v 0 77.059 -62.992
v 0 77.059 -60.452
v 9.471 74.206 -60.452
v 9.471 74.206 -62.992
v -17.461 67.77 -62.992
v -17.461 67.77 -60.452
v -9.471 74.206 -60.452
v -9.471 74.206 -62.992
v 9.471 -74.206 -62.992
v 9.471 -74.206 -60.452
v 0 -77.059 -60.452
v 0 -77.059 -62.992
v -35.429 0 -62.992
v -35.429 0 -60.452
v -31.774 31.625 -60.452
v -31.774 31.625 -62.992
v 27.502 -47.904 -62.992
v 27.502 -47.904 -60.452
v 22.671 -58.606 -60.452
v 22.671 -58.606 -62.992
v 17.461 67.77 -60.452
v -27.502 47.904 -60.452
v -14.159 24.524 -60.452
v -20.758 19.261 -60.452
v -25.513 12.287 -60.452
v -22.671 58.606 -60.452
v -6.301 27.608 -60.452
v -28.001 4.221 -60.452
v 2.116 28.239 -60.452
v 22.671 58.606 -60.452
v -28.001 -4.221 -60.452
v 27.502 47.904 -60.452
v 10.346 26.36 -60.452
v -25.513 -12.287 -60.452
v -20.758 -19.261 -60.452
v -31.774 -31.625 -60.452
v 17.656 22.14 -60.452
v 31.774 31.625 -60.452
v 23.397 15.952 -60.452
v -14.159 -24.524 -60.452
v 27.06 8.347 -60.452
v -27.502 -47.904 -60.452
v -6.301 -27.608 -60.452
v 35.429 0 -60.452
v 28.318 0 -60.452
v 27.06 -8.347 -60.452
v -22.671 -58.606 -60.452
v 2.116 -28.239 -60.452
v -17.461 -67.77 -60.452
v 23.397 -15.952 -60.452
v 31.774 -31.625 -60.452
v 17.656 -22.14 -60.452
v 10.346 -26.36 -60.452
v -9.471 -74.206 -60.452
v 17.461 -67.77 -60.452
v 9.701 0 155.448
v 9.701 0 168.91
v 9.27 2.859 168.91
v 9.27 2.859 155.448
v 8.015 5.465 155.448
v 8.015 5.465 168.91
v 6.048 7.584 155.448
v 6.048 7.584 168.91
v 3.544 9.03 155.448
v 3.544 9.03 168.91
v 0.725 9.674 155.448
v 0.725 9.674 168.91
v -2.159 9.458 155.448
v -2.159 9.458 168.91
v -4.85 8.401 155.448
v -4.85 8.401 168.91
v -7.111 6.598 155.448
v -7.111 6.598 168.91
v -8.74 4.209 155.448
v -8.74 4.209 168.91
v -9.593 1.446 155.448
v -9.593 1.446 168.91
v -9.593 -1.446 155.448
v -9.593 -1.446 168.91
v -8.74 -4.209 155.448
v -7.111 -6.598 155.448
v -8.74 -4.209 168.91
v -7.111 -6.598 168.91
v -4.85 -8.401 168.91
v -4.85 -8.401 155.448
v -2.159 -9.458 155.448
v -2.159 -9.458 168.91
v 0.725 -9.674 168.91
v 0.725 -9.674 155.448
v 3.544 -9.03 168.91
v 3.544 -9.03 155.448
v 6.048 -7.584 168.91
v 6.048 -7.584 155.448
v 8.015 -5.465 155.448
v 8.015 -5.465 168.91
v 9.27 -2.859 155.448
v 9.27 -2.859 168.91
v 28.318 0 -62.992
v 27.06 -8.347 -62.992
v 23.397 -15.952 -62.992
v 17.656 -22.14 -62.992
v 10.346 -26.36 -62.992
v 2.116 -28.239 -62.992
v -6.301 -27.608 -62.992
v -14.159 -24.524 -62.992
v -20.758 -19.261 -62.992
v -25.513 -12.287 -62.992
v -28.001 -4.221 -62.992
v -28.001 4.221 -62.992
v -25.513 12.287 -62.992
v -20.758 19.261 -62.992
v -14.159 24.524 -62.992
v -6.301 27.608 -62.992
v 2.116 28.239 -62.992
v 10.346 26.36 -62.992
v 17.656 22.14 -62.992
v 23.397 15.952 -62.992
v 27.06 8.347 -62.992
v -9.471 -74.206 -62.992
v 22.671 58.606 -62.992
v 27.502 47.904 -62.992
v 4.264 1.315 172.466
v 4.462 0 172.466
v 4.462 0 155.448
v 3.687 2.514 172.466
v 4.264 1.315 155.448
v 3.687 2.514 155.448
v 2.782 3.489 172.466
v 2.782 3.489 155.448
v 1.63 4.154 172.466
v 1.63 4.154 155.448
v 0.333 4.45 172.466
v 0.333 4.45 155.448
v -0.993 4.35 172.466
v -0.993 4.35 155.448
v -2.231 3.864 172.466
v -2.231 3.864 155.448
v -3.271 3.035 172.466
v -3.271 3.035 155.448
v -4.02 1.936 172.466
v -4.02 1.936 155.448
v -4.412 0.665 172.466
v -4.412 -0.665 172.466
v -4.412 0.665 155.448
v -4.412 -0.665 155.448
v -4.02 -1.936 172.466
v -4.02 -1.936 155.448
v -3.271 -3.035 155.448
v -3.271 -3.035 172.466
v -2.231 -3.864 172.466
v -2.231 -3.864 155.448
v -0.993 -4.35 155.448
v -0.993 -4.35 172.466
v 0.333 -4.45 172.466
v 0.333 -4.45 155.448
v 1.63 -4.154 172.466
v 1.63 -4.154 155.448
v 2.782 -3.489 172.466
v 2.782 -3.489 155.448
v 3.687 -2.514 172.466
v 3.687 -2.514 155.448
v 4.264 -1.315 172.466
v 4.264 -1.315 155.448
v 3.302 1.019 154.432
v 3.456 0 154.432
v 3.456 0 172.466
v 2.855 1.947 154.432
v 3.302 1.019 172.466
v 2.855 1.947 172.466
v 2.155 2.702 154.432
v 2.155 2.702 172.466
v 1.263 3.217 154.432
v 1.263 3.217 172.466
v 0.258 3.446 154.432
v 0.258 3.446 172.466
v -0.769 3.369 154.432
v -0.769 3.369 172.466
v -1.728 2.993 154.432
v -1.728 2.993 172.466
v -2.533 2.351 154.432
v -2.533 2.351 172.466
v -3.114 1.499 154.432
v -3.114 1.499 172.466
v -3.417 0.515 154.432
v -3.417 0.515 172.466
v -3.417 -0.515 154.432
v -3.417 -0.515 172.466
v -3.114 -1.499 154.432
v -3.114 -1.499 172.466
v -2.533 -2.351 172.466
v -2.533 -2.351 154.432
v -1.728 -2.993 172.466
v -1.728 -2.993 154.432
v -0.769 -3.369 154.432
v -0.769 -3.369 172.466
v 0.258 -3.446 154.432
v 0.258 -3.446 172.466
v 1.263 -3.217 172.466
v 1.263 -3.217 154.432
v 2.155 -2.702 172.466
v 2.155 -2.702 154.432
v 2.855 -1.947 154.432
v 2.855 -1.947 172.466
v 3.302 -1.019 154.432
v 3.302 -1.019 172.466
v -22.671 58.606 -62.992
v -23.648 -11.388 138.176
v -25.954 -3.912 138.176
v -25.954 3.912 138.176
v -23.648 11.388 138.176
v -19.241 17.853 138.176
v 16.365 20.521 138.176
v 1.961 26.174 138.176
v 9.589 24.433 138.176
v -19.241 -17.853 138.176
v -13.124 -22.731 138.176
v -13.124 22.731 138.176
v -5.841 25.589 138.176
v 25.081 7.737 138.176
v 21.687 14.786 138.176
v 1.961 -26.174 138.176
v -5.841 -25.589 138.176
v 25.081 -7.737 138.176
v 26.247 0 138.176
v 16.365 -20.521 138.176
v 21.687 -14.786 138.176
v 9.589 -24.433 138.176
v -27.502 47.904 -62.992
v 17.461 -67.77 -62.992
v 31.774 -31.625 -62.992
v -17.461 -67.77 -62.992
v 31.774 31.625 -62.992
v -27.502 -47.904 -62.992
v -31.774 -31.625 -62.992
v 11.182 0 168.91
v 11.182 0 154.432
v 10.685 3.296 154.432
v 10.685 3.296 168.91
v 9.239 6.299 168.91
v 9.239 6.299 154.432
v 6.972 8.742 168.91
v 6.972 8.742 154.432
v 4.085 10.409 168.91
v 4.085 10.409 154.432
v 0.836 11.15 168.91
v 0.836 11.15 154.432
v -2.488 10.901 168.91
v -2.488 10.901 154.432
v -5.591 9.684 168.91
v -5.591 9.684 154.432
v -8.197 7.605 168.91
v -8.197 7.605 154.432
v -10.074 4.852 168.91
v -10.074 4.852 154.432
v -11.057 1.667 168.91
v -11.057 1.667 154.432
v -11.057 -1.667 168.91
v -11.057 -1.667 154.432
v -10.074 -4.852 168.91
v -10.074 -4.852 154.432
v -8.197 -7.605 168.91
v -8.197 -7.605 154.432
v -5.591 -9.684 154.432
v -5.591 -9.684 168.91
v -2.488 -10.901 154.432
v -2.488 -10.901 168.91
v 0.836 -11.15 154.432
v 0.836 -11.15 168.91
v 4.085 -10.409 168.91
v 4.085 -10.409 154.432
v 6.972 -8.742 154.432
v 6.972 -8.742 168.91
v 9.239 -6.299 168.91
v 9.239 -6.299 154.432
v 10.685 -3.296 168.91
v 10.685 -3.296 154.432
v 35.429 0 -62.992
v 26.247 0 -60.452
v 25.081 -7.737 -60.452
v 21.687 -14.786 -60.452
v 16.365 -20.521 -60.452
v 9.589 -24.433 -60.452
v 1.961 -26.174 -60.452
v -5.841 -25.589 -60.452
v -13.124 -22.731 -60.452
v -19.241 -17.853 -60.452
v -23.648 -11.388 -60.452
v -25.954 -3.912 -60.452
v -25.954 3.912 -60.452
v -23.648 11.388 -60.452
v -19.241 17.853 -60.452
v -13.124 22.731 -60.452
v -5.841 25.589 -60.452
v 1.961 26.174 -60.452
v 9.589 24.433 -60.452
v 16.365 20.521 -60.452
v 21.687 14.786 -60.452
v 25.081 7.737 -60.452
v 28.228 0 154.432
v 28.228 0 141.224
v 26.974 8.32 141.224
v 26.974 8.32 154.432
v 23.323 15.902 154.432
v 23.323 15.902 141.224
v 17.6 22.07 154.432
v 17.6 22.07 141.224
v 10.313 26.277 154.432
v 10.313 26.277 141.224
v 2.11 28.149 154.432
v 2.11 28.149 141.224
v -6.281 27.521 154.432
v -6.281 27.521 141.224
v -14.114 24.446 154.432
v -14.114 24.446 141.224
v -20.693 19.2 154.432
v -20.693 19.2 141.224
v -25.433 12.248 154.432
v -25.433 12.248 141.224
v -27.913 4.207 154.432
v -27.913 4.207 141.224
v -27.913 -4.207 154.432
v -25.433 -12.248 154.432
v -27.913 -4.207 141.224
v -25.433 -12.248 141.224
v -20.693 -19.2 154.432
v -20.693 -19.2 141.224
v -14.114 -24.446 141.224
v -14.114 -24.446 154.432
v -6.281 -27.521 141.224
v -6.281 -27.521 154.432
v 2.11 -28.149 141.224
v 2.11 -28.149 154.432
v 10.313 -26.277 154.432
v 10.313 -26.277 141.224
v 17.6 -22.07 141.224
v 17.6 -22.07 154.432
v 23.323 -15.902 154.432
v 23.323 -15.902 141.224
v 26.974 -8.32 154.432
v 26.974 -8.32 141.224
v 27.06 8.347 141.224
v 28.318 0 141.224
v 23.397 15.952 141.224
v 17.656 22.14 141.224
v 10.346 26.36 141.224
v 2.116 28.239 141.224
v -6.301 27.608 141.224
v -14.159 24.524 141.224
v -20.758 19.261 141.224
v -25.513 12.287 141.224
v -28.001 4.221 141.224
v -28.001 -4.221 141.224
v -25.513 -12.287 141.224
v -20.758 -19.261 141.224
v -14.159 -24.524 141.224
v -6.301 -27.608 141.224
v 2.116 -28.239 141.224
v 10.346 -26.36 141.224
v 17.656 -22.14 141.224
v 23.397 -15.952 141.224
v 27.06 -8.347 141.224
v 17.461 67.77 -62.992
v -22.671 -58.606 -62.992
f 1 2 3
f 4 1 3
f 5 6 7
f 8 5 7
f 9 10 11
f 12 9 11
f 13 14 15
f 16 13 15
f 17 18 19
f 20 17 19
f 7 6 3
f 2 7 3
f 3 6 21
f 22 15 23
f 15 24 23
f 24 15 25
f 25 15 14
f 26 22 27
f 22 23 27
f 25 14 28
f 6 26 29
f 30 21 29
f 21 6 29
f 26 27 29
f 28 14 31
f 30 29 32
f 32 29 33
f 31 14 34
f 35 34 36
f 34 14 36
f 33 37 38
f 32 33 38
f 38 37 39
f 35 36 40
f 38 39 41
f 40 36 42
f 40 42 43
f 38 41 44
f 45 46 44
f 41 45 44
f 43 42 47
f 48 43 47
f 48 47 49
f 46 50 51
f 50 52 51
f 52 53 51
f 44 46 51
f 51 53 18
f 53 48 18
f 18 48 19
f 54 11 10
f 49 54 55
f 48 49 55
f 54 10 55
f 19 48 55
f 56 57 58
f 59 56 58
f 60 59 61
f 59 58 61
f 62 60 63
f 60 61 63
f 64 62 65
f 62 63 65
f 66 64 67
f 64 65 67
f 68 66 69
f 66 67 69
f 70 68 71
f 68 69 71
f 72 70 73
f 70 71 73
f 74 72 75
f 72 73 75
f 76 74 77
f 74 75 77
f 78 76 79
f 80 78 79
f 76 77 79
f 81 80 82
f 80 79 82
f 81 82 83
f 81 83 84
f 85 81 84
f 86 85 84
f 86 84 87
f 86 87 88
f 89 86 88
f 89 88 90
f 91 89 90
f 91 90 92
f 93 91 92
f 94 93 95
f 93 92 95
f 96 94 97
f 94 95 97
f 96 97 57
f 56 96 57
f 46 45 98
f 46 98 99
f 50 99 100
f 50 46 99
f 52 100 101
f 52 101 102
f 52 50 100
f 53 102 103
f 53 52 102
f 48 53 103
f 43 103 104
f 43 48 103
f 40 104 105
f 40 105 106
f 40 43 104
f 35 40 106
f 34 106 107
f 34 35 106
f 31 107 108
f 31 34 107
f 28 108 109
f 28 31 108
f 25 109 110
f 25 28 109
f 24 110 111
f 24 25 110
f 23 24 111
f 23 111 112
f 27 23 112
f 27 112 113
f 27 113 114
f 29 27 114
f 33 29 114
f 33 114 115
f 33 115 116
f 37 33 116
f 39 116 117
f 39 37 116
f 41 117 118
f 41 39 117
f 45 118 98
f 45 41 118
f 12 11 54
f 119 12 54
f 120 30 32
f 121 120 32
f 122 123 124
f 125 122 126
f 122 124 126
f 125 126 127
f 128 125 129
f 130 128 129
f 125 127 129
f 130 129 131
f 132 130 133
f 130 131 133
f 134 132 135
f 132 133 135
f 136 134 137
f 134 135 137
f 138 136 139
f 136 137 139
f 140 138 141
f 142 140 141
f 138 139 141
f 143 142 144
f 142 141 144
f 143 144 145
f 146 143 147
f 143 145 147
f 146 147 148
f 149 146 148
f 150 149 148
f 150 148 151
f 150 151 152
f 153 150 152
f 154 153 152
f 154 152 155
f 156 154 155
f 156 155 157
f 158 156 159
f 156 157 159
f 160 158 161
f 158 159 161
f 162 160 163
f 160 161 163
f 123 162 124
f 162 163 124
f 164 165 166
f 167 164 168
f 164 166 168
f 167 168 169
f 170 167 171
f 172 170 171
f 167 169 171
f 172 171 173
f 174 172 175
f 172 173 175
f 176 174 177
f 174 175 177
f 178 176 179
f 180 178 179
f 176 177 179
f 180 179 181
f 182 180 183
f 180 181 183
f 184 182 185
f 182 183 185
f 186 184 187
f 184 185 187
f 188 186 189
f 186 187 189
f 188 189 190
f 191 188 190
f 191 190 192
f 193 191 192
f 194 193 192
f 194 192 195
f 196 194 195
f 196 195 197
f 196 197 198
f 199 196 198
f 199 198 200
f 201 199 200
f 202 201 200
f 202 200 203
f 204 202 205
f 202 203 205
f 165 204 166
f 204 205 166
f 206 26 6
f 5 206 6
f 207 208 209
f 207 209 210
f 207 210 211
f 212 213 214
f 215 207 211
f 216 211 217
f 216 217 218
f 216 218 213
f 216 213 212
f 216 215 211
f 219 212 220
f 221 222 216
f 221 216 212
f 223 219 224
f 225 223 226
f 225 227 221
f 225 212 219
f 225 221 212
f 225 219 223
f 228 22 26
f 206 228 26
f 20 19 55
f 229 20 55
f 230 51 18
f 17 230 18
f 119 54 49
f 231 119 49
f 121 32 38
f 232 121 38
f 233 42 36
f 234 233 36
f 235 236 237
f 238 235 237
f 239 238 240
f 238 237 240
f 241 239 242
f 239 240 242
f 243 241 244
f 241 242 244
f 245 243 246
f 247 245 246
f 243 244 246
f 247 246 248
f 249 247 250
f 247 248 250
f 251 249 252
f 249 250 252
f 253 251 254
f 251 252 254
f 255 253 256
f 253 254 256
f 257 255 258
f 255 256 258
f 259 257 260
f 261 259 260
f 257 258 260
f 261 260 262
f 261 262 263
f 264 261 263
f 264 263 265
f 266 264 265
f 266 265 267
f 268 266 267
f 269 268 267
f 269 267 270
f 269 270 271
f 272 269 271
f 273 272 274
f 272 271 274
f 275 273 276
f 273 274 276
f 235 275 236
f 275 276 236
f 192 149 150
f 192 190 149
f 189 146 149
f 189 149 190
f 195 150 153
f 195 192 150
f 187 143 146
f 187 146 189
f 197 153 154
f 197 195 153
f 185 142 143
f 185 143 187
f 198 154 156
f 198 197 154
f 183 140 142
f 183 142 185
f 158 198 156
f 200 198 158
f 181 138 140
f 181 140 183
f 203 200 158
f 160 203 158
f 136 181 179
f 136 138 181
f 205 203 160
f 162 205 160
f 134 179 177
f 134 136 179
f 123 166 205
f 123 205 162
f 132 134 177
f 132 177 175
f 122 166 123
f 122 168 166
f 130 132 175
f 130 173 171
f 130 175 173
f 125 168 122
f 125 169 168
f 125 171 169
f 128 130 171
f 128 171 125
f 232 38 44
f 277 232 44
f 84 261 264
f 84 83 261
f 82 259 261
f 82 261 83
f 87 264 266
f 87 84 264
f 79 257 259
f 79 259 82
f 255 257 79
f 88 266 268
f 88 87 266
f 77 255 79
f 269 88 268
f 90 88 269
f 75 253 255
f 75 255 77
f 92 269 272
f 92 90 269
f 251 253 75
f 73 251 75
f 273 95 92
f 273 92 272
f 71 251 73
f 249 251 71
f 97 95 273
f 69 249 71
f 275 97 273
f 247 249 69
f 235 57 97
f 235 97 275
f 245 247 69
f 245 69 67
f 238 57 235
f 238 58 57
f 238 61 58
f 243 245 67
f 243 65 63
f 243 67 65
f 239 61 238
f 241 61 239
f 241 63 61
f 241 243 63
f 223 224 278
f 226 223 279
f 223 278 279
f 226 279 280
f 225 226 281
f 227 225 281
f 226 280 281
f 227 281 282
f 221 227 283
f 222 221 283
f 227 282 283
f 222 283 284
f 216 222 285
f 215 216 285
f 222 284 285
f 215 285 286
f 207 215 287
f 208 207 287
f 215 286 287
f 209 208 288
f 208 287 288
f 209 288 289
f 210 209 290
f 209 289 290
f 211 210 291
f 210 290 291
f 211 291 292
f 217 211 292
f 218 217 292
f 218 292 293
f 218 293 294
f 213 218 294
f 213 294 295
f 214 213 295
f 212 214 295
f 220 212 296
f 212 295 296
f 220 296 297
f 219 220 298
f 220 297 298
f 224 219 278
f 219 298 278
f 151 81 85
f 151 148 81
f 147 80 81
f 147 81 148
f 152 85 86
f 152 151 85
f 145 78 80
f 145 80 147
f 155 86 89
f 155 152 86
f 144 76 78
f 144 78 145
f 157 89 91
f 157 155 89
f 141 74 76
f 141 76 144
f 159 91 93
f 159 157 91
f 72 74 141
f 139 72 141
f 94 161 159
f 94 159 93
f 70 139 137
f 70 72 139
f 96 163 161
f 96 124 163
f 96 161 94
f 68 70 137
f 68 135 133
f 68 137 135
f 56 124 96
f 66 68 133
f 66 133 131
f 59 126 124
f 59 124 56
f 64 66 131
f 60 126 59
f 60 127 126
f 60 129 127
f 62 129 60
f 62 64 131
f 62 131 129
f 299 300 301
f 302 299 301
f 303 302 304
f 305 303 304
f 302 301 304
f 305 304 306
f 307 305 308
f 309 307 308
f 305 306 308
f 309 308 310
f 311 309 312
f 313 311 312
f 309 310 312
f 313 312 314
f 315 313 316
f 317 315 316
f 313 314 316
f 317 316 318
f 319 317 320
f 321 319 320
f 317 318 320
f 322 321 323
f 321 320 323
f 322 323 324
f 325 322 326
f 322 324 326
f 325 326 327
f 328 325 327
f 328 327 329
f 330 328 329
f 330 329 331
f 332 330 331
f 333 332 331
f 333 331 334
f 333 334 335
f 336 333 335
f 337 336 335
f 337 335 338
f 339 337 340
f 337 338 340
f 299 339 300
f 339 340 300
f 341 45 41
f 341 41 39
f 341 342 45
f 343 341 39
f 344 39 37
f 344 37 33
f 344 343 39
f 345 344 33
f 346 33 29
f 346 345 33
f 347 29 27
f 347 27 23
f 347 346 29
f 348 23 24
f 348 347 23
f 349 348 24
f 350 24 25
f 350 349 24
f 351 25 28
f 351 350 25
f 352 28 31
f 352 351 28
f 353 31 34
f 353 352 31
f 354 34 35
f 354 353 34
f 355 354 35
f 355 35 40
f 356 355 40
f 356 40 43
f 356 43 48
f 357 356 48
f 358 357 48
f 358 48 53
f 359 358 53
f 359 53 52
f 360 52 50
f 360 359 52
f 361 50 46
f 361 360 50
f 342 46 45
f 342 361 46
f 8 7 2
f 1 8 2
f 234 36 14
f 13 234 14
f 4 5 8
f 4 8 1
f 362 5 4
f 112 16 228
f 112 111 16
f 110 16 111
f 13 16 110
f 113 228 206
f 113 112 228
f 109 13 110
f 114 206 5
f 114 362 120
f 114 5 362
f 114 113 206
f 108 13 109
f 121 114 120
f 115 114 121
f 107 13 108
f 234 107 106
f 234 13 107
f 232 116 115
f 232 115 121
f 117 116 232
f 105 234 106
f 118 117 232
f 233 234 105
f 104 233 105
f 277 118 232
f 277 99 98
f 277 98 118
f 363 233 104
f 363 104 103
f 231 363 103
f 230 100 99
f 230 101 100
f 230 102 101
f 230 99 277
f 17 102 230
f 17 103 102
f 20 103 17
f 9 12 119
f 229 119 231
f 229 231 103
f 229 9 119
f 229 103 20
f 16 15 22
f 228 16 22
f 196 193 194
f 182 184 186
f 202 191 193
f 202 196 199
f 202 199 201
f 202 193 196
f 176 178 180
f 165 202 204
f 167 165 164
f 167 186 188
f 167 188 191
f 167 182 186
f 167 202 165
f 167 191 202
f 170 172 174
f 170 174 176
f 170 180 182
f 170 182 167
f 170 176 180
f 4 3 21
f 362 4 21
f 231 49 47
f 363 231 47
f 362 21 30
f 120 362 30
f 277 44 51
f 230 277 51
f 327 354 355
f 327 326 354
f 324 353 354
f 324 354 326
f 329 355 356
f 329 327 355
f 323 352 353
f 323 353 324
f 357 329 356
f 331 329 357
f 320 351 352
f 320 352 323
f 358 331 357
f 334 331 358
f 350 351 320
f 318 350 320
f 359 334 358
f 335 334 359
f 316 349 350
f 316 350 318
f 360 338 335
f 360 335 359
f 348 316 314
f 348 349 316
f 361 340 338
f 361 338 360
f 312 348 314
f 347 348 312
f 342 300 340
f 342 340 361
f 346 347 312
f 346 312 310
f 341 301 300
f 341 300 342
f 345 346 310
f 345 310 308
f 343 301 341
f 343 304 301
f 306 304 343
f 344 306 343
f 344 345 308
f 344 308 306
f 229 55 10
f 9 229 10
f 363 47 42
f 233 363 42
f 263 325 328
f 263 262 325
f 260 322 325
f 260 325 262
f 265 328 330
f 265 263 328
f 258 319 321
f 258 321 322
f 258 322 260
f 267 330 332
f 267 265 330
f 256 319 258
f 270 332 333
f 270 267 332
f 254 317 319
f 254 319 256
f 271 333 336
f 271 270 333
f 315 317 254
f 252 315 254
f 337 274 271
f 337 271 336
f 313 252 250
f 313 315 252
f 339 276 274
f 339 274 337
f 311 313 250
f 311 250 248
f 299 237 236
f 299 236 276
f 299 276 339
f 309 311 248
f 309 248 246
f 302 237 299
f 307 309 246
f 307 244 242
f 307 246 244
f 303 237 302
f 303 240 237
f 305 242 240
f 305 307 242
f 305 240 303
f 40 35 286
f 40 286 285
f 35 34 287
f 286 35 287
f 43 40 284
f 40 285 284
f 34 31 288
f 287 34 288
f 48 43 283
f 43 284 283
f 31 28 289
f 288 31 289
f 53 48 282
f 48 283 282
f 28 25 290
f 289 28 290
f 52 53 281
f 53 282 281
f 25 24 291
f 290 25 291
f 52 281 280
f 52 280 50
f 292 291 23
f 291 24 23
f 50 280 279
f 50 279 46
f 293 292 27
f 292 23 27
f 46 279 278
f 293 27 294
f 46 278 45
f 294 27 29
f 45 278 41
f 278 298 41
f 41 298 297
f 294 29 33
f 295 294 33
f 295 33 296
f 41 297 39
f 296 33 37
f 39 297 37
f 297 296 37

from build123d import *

# Parameters (mm, degrees)
F0_R      = 28.3177523181
F1_DEPTH  = 141.224
F2_DEPTH  = 60.452
F3_R      = 26.2473166526
F4_DEPTH  = 198.628
F5_R      = 28.3177523181
F6_DEPTH  = 2.54
F7_R      = 28.2282534547
F8_DEPTH  = 13.208
F9_R      = 11.1815753047
F10_DEPTH = 14.478
F11_R     = 9.7009276287
F12_DEPTH = 13.462
F13_R     = 4.462331727
F14_DEPTH = 14.478
F15_DEPTH = 3.556
F16_R     = 3.4559757879
F17_DEPTH = 18.034


# Not quite as in the source:
# - a feature names something its author has since deleted; it is built from what else it names


with BuildPart() as f1:
    # F0 (on Top) → F1 (new body)
    with BuildSketch(Plane.XY):
        Circle(F0_R)
    extrude(amount=F1_DEPTH)

    # F2 (add): a face of the model
    f2_faces = [f1.faces().sort_by_distance(p)[0] for p in [
        (0, 0, 0),
    ]]
    extrude(f2_faces, amount=F2_DEPTH)

    # F3 (on face) → F4 (cut)
    with BuildSketch(Plane(origin=(0, 0, -60.452), x_dir=(1, 0, 0), z_dir=(0, 0, -1))):
        Circle(F3_R)
    extrude(amount=-F4_DEPTH, mode=Mode.SUBTRACT)

    # F7 (on face) → F8 (join)
    with BuildSketch(Plane.XY.offset(141.224)):
        Circle(F7_R)
    extrude(amount=F8_DEPTH)

    # F9 (on face) → F10 (join)
    with BuildSketch(Plane.XY.offset(154.432)):
        Circle(F9_R)
    extrude(amount=F10_DEPTH)

    # F11 (on face) → F12 (cut)
    with BuildSketch(Plane.XY.offset(168.91)):
        Circle(F11_R)
    extrude(amount=-F12_DEPTH, mode=Mode.SUBTRACT)

    # F13 (on face) → F14 (join)
    with BuildSketch(Plane.XY.offset(168.91)):
        Circle(F13_R)
    extrude(amount=-F14_DEPTH)

    # F15 (add): a face of the model
    f15_faces = [f1.faces().sort_by_distance(p)[0] for p in [
        (0, 0, 168.91),
    ]]
    extrude(f15_faces, amount=F15_DEPTH)

    # F16 (on face) → F17 (cut)
    with BuildSketch(Plane.XY.offset(172.466)):
        Circle(F16_R)
    extrude(amount=-F17_DEPTH, mode=Mode.SUBTRACT)


with BuildPart() as f6:
    # F5 (on face) → F6 (new body)
    with BuildSketch(Plane(origin=(0, 0, -60.452), x_dir=(1, 0, 0), z_dir=(0, 0, -1))):
        Polygon((9.4713624567, 74.2058157921), (0, 77.0585462451), (-9.4713624567, 74.2058157921), (-17.4607206136, 67.7697062492), (-22.6705633104, 58.6060807109), (-27.5022350252, 47.904137522), (-31.7738913, 31.6246189177), (-35.4287400842, 0), (-31.7738913, -31.6246189177), (-27.5022350252, -47.904137522), (-22.6705633104, -58.6060807109), (-17.4607206136, -67.7697062492), (-9.4713624567, -74.2058157921), (0, -77.0585462451), (9.4713624567, -74.2058157921), (17.4607206136, -67.7697062492), (22.6705633104, -58.6060807109), (27.5022350252, -47.904137522), (31.7738913, -31.6246189177), (35.4287400842, 0), (31.7738913, 31.6246189177), (27.5022350252, 47.904137522), (22.6705633104, 58.6060807109), (17.4607206136, 67.7697062492), align=None)
        Circle(F5_R, mode=Mode.SUBTRACT)
    extrude(amount=F6_DEPTH)


solid = Compound([f1.part, f6.part])
